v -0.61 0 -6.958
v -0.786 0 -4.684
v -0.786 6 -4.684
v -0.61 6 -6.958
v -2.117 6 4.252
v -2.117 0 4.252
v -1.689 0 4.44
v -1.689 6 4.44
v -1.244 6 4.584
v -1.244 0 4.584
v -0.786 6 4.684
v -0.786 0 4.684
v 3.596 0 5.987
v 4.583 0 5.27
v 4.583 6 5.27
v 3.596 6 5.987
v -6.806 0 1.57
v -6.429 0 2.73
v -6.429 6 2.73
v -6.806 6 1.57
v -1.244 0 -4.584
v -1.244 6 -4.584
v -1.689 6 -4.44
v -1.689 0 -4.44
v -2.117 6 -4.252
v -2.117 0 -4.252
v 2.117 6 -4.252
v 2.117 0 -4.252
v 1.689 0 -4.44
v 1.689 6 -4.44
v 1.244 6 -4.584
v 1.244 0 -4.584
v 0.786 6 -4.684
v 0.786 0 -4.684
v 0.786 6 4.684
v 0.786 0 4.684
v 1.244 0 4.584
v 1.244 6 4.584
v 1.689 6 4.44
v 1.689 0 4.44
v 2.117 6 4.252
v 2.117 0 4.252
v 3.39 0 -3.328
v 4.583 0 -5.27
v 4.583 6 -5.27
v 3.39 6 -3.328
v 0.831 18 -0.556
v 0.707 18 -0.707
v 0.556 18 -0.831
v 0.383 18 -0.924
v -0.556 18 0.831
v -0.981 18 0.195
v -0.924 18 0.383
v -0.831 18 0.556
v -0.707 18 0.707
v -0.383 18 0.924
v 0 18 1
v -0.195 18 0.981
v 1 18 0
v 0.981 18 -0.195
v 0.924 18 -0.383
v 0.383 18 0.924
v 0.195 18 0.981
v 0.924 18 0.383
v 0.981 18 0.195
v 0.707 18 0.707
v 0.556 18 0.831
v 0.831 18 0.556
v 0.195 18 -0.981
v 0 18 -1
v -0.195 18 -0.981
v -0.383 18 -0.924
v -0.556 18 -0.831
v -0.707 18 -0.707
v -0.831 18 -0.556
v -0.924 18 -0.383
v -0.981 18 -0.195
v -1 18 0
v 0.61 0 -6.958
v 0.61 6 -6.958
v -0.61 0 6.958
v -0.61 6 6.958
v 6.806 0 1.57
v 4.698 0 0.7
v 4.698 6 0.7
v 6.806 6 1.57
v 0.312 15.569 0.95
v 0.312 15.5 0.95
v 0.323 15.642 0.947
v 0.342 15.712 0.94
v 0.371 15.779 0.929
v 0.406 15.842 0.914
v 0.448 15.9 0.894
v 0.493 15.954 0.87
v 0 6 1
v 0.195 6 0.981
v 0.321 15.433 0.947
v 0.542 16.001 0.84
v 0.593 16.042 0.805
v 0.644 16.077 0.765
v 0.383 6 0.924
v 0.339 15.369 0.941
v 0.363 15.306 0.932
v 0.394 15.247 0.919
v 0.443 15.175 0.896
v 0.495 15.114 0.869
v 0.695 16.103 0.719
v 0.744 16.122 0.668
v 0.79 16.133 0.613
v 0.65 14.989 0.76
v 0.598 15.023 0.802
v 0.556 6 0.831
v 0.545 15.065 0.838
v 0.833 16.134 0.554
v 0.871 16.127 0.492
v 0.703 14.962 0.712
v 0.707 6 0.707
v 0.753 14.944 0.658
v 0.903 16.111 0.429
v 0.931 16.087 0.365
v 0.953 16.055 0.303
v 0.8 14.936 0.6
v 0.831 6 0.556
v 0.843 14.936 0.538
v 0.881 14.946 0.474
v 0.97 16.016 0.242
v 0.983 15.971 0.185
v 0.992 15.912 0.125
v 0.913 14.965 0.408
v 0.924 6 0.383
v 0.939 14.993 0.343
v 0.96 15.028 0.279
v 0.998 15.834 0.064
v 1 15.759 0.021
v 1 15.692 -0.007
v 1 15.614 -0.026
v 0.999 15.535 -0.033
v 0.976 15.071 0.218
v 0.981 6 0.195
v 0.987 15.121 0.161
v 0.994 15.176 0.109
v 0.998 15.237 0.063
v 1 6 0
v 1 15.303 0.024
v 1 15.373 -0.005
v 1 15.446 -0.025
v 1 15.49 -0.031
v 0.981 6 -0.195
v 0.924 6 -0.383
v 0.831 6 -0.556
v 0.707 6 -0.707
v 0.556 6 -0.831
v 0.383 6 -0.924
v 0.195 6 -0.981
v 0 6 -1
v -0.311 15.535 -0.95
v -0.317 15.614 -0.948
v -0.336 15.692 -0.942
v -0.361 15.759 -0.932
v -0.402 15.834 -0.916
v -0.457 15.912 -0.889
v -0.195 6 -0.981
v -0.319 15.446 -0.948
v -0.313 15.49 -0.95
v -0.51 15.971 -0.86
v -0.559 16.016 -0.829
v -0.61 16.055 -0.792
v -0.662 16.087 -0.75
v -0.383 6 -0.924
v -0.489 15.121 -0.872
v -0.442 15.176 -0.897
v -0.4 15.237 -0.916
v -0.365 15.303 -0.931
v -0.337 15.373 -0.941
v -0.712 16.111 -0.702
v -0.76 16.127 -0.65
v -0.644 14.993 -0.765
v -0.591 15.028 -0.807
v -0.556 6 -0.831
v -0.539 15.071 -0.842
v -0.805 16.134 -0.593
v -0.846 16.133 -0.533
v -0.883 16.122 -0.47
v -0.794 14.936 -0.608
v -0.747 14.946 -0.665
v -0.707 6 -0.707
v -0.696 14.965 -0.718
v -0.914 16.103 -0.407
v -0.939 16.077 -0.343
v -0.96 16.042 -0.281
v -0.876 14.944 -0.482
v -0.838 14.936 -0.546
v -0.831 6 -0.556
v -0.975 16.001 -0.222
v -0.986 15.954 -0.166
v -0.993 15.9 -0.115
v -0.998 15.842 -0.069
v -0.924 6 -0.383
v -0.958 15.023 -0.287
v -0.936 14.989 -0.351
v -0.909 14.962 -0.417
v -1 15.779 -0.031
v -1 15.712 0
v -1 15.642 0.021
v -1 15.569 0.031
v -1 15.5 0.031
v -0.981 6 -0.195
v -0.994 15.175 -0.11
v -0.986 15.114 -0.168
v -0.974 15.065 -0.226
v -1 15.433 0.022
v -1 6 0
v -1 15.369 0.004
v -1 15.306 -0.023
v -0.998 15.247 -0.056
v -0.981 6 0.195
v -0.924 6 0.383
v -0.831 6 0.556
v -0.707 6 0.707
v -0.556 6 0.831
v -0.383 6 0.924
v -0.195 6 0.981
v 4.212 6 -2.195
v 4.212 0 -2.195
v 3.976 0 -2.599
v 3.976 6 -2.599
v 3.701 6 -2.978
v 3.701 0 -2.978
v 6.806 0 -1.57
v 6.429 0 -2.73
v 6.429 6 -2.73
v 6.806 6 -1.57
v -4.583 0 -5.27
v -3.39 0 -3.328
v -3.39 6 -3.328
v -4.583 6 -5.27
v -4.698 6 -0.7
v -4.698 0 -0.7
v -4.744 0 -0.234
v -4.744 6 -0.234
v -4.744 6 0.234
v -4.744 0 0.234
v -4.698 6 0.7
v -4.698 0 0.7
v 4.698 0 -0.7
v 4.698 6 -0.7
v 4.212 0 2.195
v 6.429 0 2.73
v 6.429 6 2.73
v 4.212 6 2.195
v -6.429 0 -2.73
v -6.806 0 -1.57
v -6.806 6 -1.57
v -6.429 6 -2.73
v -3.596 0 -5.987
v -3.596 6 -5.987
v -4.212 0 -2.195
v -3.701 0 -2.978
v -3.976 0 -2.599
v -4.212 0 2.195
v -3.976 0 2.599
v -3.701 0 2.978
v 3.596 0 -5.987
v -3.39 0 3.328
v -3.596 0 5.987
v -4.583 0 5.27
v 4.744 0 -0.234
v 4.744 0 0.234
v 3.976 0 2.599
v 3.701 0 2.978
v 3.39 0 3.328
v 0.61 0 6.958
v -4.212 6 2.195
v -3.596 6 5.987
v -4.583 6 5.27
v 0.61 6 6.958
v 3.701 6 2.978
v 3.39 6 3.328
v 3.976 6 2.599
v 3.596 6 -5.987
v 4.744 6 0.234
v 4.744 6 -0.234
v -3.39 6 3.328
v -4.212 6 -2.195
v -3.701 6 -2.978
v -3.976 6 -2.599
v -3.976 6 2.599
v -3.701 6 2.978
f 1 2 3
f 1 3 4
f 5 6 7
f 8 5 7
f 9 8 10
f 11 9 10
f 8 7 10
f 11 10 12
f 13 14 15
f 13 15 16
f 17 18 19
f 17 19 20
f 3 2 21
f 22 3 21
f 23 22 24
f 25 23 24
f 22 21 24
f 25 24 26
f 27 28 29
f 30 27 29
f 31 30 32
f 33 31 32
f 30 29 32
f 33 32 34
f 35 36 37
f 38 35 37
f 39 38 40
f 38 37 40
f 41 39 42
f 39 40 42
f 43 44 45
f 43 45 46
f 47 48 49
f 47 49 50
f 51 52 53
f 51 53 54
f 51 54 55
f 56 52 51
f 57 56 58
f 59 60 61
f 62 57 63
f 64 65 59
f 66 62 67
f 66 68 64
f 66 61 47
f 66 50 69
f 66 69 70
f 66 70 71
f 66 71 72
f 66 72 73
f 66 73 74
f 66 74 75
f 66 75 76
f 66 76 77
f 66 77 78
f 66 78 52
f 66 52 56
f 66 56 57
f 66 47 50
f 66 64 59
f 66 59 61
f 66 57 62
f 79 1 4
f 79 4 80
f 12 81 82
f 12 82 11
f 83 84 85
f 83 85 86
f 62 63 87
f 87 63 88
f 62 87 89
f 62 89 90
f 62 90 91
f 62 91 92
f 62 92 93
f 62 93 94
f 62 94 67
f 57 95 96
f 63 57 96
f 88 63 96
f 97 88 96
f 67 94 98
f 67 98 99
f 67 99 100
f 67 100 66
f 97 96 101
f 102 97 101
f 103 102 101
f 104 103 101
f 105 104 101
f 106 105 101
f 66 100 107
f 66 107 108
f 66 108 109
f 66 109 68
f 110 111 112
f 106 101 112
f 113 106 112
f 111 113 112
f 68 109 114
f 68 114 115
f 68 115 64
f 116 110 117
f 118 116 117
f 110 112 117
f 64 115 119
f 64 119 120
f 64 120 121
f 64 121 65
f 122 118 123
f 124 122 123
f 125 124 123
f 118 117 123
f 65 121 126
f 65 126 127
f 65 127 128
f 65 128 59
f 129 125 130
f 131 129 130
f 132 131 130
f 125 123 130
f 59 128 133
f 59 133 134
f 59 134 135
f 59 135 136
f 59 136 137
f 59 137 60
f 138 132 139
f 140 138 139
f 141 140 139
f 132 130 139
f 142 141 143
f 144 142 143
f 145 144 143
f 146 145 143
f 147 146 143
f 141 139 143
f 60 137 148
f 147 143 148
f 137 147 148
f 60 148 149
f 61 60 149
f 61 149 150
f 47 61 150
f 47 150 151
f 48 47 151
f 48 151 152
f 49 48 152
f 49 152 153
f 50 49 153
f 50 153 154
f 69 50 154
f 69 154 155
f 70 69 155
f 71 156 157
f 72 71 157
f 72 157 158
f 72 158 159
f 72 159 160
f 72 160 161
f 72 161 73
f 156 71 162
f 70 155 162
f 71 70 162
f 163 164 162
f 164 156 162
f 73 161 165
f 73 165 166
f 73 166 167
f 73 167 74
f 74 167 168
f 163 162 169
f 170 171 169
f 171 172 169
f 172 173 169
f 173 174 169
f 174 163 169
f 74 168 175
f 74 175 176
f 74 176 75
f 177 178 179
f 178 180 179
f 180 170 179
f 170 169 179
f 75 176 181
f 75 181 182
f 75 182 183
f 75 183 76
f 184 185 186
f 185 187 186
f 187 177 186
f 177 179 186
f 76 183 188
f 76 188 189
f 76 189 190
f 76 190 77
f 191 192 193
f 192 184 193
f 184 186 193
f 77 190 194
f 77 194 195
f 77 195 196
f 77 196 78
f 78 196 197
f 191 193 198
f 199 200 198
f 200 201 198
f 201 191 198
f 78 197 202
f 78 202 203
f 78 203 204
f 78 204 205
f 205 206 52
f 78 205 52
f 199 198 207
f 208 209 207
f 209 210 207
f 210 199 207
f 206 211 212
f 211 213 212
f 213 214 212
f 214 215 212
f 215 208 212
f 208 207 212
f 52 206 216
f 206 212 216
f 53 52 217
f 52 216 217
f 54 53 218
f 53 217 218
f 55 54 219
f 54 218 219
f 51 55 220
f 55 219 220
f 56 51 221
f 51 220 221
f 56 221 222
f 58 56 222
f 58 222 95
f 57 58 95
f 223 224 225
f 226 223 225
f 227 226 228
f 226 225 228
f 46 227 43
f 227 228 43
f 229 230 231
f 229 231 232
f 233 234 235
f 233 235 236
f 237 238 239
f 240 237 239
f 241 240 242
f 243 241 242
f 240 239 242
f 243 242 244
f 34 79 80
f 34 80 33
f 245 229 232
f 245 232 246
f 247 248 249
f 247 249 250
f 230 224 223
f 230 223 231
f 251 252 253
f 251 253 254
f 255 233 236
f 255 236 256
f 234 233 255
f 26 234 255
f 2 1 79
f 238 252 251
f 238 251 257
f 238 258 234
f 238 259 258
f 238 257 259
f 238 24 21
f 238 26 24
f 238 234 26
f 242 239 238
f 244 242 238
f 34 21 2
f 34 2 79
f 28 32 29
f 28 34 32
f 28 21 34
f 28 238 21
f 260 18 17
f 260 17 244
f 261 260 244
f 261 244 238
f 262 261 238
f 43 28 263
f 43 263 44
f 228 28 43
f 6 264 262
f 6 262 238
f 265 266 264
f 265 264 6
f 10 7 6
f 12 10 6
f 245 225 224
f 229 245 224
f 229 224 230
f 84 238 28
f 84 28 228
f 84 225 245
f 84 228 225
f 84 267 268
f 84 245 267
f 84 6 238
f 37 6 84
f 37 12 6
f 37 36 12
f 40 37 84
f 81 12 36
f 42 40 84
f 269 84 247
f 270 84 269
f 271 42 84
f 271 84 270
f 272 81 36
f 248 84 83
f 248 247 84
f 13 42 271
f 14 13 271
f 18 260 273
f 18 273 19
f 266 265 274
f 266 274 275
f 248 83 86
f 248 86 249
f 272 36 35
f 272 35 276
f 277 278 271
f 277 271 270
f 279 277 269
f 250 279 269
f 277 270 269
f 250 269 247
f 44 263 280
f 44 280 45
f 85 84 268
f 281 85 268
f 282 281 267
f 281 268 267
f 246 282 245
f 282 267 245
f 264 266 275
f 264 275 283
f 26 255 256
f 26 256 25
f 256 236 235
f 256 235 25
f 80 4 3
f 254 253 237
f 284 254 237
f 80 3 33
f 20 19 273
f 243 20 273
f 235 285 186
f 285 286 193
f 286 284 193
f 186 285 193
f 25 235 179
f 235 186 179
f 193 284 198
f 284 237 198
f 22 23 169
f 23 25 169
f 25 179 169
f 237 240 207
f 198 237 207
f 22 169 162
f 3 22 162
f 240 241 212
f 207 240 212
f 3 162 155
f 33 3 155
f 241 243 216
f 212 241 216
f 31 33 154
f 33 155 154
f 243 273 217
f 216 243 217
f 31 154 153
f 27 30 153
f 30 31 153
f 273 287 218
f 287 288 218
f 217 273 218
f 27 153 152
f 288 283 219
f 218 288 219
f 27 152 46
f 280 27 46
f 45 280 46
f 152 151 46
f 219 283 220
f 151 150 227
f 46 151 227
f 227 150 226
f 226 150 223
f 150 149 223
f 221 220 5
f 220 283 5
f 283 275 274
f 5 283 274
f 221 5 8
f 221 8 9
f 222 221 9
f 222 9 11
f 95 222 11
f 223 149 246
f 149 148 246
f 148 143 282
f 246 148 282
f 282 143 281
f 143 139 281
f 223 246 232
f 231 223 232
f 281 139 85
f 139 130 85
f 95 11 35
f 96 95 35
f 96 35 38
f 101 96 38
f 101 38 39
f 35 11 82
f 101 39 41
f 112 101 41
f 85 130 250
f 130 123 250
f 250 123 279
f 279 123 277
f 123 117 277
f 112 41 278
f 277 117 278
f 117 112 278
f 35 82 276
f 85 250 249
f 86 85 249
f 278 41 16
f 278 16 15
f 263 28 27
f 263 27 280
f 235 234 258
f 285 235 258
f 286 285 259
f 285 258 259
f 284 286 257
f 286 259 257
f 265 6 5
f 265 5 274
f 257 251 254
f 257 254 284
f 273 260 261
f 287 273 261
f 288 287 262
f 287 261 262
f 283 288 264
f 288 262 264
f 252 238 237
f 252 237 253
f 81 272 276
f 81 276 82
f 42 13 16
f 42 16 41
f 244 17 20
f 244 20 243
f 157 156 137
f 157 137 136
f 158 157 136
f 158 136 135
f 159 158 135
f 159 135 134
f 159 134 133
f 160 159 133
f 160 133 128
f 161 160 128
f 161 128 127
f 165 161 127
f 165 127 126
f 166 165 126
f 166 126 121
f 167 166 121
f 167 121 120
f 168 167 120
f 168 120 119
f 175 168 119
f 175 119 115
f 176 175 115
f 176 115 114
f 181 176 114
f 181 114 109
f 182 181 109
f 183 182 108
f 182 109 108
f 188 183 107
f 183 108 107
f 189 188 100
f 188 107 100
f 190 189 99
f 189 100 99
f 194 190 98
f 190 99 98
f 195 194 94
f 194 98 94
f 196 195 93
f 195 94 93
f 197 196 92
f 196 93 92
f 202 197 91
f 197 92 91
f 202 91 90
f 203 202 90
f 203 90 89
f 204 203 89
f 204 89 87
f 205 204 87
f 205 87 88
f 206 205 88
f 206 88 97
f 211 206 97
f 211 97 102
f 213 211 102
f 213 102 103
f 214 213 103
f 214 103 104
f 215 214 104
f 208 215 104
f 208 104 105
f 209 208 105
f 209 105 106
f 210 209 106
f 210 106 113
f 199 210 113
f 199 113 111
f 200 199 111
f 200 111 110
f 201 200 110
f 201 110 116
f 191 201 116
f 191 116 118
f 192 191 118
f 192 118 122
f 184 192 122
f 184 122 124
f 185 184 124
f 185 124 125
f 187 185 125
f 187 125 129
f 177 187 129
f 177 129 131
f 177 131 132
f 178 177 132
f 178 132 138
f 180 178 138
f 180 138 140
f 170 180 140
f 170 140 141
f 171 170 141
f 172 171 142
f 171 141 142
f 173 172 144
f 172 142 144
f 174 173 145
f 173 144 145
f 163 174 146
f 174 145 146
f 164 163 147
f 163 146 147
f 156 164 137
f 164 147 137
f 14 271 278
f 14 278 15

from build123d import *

# Parameters (mm, degrees)
SKETCH1_R           = 4.75
GEAR_ROOT_DEPTH     = 6
SKETCH3_R           = 1
NEEDLE_SHAFT_DEPTH  = 18
BOSS_EXTRUDE1_DEPTH = 6
SKETCH7_R           = 0.6
CUT_EXTRUDE1_DEPTH  = 10


with BuildPart() as part:
    # Sketch1 → GEAR_ROOT (new body)
    with BuildSketch(Plane(origin=(0, 0, 0), x_dir=(1, 0, 0), z_dir=(0, 1, 0))):
        with Locations(Location((0, 0, 0), (0, 0, 270))):
            Circle(SKETCH1_R)
    extrude(amount=GEAR_ROOT_DEPTH)

    # Sketch3 → NEEDLE_SHAFT (add)
    with BuildSketch(Plane(origin=(0, 0, 0), x_dir=(1, 0, 0), z_dir=(0, 1, 0))):
        with Locations(Location((0, 0, 0), (0, 0, 270))):
            Circle(SKETCH3_R)
    extrude(amount=NEEDLE_SHAFT_DEPTH)

    # Sketch6 → Boss-Extrude1 (add)
    with BuildSketch(Plane.XZ):
        with BuildLine():
            Line((0.61, 6.95761567), (-0.61, 6.95761567))
            Line((-0.61, 6.95761567), (-0.786402192, 4.684449978))
            ThreePointArc((-0.786402192, 4.684449978), (0, 4.75), (0.786402192, 4.684449978))
            Line((0.786402192, 4.684449978), (0.61, 6.95761567))
        make_face()
        with BuildLine():
            Line((4.583084249, 5.270280314), (3.596083516, 5.987378321))
            Line((3.596083516, 5.987378321), (2.117237874, 4.252035252))
            ThreePointArc((2.117237874, 4.252035252), (2.791979948, 3.842830723), (3.38966335, 3.32756403))
            Line((3.38966335, 3.32756403), (4.583084249, 5.270280314))
        make_face()
        with BuildLine():
            Line((6.805586088, 1.569877008), (6.428585355, 2.730165957))
            Line((6.428585355, 2.730165957), (4.212165035, 2.195487582))
            ThreePointArc((4.212165035, 2.195487582), (4.517518452, 1.467830723), (4.698188318, 0.699661723))
            Line((4.698188318, 0.699661723), (6.805586088, 1.569877008))
        make_face()
        with BuildLine():
            Line((6.428585355, -2.730165957), (6.805586088, -1.569877008))
            Line((6.805586088, -1.569877008), (4.698188318, -0.699661723))
            ThreePointArc((4.698188318, -0.699661723), (4.517518452, -1.467830723), (4.212165035, -2.195487582))
            Line((4.212165035, -2.195487582), (6.428585355, -2.730165957))
        make_face()
        with BuildLine():
            Line((3.596083516, -5.987378321), (4.583084249, -5.270280314))
            Line((4.583084249, -5.270280314), (3.38966335, -3.32756403))
            ThreePointArc((3.38966335, -3.32756403), (2.791979948, -3.842830723), (2.117237874, -4.252035252))
            Line((2.117237874, -4.252035252), (3.596083516, -5.987378321))
        make_face()
        with BuildLine():
            Line((-0.61, -6.95761567), (0.61, -6.95761567))
            Line((0.61, -6.95761567), (0.786402192, -4.684449978))
            ThreePointArc((0.786402192, -4.684449978), (0, -4.75), (-0.786402192, -4.684449978))
            Line((-0.786402192, -4.684449978), (-0.61, -6.95761567))
        make_face()
        with BuildLine():
            Line((-4.583084249, -5.270280314), (-3.596083516, -5.987378321))
            Line((-3.596083516, -5.987378321), (-2.117237874, -4.252035252))
            ThreePointArc((-2.117237874, -4.252035252), (-2.791979948, -3.842830723), (-3.38966335, -3.32756403))
            Line((-3.38966335, -3.32756403), (-4.583084249, -5.270280314))
        make_face()
        with BuildLine():
            Line((-6.805586088, -1.569877008), (-6.428585355, -2.730165957))
            Line((-6.428585355, -2.730165957), (-4.212165035, -2.195487582))
            ThreePointArc((-4.212165035, -2.195487582), (-4.517518452, -1.467830723), (-4.698188318, -0.699661723))
            Line((-4.698188318, -0.699661723), (-6.805586088, -1.569877008))
        make_face()
        with BuildLine():
            Line((-6.428585355, 2.730165957), (-6.805586088, 1.569877008))
            Line((-6.805586088, 1.569877008), (-4.698188318, 0.699661723))
            ThreePointArc((-4.698188318, 0.699661723), (-4.517518452, 1.467830723), (-4.212165035, 2.195487582))
            Line((-4.212165035, 2.195487582), (-6.428585355, 2.730165957))
        make_face()
        with BuildLine():
            Line((-3.596083516, 5.987378321), (-4.583084249, 5.270280314))
            Line((-4.583084249, 5.270280314), (-3.38966335, 3.32756403))
            ThreePointArc((-3.38966335, 3.32756403), (-2.791979948, 3.842830723), (-2.117237874, 4.252035252))
            Line((-2.117237874, 4.252035252), (-3.596083516, 5.987378321))
        make_face()
    extrude(amount=-BOSS_EXTRUDE1_DEPTH)

    # Sketch7 → Cut-Extrude1 (cut)
    with BuildSketch(Plane(origin=(1.228784274, 0, 0.860284377), x_dir=(0.5735229177482851, 0, -0.8191895158127294), z_dir=(0.8191895158127294, 0, 0.5735229177482851))):
        with Locations((0, 15.53461336)):
            Circle(SKETCH7_R)
    extrude(amount=-CUT_EXTRUDE1_DEPTH, mode=Mode.SUBTRACT)


solid = part.part
